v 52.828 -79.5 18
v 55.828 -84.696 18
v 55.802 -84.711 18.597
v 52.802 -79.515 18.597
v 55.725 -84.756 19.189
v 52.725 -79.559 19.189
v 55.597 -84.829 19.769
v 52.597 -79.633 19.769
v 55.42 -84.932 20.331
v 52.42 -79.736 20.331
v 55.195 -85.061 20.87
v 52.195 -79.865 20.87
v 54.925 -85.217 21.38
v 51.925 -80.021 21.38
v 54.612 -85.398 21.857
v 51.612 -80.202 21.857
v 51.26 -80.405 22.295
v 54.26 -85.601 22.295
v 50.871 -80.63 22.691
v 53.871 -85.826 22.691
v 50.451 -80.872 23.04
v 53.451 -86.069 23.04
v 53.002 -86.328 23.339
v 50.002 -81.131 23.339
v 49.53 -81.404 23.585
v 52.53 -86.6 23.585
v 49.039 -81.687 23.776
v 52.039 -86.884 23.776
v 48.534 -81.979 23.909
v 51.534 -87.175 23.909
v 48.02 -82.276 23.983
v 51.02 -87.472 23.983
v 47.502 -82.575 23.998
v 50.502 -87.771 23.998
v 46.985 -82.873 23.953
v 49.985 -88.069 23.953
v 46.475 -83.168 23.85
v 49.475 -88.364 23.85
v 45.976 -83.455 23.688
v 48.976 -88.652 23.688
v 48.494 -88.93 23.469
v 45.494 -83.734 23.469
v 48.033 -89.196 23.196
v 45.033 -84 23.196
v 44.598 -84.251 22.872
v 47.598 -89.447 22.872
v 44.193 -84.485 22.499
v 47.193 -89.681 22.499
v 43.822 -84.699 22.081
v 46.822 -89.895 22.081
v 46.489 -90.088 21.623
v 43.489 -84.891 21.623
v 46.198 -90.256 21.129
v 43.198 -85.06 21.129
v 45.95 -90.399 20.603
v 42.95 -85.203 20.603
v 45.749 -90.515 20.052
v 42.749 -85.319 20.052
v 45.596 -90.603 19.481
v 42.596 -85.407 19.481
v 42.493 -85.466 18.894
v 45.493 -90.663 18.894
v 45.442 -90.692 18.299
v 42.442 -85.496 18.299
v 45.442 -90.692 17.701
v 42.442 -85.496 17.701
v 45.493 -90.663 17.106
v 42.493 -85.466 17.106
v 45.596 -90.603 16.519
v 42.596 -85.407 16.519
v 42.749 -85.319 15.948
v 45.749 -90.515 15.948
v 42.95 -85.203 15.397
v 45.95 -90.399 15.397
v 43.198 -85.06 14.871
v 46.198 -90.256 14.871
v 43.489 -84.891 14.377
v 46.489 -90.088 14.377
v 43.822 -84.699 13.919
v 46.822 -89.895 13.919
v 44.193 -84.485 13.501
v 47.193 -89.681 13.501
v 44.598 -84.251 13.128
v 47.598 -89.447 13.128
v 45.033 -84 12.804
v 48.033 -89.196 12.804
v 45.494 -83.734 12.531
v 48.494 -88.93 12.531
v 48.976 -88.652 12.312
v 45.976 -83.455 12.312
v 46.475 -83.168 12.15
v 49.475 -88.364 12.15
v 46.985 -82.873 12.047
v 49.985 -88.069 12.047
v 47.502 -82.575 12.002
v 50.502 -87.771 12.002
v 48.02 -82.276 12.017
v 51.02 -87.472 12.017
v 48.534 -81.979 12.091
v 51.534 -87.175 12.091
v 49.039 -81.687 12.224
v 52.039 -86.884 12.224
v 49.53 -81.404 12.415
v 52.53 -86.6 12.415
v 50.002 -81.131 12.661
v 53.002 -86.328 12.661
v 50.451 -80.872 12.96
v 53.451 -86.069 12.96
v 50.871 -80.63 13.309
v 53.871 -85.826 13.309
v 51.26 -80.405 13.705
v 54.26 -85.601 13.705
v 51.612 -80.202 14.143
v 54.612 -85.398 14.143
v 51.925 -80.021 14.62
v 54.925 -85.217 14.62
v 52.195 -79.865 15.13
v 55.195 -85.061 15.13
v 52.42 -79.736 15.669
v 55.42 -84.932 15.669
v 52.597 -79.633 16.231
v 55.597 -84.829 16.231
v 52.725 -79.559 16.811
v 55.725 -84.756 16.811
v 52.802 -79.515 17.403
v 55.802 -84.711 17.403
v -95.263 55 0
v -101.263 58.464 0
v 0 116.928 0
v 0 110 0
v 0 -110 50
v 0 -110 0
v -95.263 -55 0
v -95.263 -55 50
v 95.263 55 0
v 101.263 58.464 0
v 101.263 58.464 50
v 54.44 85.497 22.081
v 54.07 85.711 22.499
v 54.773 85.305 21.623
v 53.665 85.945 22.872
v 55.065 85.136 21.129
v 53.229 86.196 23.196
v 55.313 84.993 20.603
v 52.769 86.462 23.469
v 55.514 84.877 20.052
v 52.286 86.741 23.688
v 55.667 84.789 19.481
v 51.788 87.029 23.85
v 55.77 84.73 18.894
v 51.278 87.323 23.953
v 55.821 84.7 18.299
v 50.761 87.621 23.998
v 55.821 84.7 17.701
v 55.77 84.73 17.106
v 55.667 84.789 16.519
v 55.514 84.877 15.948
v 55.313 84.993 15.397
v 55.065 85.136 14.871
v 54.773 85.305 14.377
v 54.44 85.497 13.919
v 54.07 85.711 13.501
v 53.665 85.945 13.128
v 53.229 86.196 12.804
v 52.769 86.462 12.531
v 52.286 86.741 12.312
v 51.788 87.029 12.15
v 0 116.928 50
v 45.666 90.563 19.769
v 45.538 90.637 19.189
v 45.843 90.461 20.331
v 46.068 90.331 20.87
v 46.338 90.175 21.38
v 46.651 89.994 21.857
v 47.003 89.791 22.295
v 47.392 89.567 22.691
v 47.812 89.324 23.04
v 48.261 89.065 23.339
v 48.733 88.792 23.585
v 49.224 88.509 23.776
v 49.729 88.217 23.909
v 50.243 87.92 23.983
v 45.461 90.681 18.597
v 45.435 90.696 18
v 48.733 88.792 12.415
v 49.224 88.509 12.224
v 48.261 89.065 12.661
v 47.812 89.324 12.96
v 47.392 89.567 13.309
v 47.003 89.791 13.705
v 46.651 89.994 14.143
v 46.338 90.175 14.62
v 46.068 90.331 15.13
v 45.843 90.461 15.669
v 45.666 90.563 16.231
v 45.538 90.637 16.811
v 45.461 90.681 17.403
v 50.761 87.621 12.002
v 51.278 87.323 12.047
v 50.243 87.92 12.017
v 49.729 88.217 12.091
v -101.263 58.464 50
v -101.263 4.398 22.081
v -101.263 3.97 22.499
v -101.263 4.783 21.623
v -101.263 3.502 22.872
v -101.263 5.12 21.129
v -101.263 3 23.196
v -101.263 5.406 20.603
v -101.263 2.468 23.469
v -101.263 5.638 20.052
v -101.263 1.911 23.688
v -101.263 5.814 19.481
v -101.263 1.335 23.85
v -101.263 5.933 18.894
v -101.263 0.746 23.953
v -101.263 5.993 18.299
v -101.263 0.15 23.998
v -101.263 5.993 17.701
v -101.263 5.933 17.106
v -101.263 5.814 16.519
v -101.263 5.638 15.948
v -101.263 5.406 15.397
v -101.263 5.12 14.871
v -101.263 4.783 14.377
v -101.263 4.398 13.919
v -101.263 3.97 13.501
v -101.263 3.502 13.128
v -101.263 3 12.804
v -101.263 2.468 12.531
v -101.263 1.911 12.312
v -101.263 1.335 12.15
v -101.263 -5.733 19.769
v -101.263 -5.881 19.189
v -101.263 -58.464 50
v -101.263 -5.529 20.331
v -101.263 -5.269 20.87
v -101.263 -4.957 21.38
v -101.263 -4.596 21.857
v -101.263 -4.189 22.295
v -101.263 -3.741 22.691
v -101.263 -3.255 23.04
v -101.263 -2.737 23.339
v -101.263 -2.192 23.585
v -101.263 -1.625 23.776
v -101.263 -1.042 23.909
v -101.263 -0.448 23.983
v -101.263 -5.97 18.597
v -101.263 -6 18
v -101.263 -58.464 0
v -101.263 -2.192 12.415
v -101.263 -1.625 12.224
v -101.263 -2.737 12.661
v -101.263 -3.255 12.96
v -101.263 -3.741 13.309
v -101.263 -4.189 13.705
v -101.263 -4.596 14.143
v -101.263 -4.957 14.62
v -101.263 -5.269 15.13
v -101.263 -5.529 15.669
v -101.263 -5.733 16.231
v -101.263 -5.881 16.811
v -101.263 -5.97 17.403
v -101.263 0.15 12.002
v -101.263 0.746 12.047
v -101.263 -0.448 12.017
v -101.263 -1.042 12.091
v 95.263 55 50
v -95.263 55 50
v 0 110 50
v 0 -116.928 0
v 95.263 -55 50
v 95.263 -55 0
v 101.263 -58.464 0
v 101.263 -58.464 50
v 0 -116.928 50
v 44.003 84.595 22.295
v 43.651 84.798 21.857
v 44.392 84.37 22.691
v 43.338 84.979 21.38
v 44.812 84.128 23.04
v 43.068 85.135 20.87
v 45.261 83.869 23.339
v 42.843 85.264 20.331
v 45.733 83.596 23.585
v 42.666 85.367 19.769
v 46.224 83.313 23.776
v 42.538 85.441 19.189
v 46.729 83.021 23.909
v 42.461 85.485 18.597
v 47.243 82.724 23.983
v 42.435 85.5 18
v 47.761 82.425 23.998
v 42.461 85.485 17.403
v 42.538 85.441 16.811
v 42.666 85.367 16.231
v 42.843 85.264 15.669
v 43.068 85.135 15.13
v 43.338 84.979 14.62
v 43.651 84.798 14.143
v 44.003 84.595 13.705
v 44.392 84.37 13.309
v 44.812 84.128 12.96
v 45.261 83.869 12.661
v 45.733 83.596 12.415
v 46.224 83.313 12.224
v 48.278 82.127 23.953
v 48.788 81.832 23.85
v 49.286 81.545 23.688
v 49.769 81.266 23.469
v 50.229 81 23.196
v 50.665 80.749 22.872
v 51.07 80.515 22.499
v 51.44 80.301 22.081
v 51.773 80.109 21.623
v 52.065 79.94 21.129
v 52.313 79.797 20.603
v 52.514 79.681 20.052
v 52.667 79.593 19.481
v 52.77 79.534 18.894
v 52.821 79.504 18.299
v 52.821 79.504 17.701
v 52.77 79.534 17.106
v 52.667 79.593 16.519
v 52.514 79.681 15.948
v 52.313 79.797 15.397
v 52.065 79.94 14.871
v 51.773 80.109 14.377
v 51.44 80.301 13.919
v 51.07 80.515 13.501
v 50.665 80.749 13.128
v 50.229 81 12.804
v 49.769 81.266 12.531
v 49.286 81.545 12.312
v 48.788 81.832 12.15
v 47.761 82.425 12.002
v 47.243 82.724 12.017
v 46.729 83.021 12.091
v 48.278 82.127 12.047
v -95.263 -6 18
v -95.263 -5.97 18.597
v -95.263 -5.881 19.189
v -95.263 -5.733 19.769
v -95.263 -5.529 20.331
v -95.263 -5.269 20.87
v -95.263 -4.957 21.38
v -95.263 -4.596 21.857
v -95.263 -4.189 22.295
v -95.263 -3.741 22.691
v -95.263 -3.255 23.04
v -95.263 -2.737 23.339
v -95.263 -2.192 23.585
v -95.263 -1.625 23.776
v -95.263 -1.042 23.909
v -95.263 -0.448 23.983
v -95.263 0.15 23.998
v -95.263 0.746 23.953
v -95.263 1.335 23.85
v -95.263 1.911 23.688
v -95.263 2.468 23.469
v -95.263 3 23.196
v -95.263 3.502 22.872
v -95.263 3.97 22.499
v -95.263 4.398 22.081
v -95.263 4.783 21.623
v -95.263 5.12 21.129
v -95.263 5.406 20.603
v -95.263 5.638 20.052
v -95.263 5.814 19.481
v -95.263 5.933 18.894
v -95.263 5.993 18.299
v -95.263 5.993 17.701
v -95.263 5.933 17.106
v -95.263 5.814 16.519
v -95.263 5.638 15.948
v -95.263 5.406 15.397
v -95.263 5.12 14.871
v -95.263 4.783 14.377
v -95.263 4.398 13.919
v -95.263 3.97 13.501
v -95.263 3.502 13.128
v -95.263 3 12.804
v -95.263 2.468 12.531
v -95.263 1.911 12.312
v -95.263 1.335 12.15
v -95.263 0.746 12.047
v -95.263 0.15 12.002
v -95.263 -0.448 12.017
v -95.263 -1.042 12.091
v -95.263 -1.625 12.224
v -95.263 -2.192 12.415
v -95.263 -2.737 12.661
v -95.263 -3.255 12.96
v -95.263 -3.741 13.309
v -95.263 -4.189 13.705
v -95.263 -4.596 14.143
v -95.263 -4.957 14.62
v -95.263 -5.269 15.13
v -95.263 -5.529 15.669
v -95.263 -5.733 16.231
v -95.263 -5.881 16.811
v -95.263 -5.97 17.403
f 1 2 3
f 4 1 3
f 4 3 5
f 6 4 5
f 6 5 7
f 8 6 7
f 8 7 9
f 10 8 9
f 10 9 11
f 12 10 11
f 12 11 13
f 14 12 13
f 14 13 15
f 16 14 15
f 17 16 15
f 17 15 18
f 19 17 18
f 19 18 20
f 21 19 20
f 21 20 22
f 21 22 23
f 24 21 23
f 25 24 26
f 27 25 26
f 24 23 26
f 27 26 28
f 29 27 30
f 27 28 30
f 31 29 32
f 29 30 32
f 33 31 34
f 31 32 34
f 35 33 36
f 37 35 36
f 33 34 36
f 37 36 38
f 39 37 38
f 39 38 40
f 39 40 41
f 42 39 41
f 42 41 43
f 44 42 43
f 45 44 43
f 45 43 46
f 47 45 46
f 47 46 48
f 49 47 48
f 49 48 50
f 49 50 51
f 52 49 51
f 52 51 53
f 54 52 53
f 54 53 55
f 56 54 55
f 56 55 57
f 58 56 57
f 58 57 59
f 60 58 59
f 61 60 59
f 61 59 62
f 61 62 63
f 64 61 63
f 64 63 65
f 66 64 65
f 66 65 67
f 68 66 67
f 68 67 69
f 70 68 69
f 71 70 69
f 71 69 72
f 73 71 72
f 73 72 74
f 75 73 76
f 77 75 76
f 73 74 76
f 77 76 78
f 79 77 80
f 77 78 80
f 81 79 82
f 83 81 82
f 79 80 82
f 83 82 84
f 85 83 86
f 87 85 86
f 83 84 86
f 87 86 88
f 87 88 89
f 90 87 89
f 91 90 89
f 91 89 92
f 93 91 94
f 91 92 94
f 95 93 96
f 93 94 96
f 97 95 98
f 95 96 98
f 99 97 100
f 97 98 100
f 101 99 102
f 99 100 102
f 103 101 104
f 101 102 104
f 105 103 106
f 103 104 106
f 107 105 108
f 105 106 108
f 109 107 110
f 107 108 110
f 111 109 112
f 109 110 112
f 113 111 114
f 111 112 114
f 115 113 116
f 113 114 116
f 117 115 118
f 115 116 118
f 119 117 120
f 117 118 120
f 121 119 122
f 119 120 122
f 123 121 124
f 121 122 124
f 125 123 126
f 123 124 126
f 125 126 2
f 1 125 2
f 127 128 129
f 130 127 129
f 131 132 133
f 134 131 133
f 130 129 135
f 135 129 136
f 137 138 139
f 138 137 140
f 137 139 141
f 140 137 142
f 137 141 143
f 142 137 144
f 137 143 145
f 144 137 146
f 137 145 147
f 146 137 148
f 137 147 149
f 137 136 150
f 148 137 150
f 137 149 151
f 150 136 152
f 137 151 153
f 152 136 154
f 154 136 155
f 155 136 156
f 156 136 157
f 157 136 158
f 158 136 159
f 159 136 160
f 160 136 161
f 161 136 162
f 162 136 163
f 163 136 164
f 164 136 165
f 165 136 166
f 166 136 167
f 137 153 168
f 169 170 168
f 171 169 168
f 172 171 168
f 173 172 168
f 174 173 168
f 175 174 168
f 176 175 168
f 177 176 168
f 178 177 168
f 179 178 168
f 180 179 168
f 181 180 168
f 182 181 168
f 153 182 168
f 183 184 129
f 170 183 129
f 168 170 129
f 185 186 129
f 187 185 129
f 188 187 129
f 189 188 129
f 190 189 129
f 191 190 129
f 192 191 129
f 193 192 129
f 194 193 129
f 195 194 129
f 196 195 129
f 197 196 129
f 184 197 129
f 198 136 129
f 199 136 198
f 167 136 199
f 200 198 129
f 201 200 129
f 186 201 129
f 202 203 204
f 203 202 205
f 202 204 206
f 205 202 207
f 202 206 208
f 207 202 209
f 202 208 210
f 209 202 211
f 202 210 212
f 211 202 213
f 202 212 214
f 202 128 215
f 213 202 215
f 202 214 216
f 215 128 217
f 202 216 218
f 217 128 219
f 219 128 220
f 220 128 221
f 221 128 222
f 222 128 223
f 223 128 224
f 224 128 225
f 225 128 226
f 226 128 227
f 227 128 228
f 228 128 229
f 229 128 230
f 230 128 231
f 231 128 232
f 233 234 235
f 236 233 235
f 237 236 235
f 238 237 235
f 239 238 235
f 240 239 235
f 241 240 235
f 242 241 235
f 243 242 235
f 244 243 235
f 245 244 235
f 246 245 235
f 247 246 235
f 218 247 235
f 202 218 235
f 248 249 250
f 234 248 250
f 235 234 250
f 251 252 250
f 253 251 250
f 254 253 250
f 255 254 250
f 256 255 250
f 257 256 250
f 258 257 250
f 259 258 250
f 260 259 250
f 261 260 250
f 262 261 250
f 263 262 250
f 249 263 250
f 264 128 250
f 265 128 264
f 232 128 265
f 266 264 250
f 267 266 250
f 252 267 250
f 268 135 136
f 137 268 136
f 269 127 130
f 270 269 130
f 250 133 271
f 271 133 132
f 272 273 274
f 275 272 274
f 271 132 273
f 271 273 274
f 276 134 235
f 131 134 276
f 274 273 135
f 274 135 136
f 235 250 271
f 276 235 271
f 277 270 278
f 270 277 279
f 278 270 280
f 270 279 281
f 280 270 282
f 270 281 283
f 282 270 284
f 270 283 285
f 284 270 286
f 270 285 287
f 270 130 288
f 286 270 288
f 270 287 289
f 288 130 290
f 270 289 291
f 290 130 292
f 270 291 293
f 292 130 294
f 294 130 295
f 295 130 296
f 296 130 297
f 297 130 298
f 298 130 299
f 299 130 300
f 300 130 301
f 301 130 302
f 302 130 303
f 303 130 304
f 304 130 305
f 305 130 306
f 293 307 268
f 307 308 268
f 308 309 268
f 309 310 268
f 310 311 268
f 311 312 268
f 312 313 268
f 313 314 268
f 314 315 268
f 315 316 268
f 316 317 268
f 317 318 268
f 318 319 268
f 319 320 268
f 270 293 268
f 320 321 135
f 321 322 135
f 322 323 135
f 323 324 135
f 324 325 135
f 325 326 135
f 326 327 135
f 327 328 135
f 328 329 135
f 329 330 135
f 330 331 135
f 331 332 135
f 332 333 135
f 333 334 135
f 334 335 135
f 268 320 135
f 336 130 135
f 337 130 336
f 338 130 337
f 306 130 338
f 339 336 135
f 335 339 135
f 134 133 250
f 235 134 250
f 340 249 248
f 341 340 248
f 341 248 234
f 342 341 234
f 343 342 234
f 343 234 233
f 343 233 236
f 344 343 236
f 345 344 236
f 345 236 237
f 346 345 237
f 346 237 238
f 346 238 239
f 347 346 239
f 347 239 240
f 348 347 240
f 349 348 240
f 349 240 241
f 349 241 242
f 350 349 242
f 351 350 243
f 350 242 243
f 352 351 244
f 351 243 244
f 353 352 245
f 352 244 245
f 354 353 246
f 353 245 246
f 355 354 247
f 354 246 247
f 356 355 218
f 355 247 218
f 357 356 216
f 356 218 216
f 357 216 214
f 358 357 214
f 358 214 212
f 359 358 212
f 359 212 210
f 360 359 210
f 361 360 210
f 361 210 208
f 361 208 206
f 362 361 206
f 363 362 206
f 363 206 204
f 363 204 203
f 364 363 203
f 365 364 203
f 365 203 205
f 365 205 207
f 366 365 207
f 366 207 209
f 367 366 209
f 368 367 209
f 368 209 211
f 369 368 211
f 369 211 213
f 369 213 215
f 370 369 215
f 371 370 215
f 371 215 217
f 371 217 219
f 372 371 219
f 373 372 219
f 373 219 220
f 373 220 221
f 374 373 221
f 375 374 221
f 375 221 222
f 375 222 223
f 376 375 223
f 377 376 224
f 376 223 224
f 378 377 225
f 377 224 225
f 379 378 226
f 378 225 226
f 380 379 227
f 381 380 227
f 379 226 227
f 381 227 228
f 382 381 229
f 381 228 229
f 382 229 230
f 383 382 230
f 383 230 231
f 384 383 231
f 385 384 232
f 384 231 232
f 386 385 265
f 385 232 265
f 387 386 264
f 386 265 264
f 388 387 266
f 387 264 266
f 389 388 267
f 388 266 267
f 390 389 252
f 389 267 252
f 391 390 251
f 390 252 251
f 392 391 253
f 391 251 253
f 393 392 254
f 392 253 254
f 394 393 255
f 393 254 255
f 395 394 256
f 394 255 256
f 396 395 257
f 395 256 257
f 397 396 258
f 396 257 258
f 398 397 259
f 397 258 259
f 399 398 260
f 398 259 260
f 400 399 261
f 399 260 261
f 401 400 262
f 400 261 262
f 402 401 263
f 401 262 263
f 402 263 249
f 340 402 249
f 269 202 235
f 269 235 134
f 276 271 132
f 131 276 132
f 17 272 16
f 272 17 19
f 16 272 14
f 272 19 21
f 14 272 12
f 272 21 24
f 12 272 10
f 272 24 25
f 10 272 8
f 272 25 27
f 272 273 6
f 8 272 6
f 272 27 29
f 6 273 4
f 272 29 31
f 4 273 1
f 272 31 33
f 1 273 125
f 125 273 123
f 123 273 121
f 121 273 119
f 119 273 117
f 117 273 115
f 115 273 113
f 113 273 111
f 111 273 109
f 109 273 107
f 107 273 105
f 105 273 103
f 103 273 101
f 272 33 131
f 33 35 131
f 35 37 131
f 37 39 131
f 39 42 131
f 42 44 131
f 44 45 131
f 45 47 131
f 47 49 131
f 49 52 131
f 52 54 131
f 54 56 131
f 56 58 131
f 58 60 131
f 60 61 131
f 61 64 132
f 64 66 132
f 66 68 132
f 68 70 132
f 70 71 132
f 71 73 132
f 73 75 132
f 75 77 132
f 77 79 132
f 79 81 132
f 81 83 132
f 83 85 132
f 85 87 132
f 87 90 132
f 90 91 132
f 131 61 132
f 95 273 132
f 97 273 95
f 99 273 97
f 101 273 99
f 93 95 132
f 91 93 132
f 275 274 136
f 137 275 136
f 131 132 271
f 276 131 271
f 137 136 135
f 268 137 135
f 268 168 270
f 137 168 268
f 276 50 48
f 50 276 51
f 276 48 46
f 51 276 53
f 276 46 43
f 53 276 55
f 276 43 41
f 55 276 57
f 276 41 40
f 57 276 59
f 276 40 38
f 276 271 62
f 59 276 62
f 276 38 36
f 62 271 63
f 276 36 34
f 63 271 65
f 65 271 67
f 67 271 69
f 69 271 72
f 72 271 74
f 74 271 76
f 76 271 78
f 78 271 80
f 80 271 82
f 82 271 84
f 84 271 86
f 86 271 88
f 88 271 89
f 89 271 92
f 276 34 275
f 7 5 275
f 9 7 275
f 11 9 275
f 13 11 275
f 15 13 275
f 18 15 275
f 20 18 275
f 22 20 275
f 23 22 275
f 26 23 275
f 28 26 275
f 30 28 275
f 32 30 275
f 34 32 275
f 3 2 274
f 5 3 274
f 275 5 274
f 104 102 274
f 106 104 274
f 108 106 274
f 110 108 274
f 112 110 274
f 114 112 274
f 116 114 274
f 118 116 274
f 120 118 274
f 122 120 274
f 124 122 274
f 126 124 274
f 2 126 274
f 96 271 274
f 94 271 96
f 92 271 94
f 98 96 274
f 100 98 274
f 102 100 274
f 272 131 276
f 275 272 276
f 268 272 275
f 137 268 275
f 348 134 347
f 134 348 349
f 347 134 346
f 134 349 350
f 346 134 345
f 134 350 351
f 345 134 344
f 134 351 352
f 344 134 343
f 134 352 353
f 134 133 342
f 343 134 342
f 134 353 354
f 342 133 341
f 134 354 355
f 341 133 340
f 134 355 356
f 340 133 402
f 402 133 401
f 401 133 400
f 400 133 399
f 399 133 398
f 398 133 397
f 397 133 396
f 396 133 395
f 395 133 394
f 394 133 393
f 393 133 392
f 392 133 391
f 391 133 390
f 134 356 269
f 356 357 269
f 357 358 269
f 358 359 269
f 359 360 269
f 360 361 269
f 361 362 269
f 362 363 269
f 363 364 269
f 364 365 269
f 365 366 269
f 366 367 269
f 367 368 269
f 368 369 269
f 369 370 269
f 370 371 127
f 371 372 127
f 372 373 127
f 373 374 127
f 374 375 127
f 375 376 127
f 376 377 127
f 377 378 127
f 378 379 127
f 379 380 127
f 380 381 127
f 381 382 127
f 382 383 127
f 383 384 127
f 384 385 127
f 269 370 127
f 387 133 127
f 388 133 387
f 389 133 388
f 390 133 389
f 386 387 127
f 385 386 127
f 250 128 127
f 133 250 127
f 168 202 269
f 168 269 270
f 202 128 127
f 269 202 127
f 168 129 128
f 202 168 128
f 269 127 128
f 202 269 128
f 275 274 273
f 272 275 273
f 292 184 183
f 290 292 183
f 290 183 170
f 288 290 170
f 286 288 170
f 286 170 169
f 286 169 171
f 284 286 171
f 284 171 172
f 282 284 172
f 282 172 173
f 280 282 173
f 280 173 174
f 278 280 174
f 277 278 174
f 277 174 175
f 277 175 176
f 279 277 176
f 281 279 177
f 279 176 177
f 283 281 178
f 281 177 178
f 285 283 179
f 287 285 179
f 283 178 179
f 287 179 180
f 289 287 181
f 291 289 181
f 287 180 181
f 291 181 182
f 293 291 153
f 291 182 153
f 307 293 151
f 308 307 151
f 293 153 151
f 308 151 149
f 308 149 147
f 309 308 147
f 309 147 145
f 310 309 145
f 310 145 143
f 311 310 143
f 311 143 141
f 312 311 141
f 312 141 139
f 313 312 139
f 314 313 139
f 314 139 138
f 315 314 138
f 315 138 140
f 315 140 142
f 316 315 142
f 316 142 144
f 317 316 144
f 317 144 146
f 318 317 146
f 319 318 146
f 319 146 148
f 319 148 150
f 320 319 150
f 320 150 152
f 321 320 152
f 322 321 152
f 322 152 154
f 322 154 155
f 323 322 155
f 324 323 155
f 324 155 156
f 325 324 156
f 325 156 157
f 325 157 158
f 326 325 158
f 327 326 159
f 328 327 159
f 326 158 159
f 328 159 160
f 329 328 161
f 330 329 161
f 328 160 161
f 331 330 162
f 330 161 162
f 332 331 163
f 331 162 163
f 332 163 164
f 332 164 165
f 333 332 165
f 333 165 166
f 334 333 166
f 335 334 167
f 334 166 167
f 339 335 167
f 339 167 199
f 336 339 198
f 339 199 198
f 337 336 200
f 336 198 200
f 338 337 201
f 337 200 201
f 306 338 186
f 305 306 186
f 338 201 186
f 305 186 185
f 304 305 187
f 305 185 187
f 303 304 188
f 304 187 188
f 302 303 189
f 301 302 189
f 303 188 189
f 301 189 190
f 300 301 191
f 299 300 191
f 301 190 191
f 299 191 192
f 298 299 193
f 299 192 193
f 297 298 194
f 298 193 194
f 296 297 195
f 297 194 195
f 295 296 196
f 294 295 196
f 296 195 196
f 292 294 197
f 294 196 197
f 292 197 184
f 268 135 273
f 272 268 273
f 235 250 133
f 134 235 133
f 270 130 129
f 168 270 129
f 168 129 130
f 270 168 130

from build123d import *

# Parameters (mm, degrees)
F1_DEPTH  = 50
F2_DEPTH  = 50
F3_DEPTH  = 50
F4_DEPTH  = 50
F5_DEPTH  = 50
F6_DEPTH  = 50
F7_R      = 6
F8_DEPTH  = 25
F9_R      = 6
F11_DEPTH = 25
F10_R     = 6
F12_DEPTH = 25


with BuildPart() as f1:
    # F0 (on Top) → F1 (new body)
    with BuildSketch(Plane.XY):
        Polygon((0, 110), (0, 116.9282032303), (-101.2627944163, 58.4641016151), (-95.2627944163, 55), align=None)
    extrude(amount=F1_DEPTH)


with BuildPart() as f2:
    # F0 (on Top) → F2 (new body)
    with BuildSketch(Plane.XY):
        Polygon((-101.2627944163, 58.4641016151), (-101.2627944163, -58.4641016151), (-95.2627944163, -55), (-95.2627944163, 55), align=None)
    extrude(amount=F2_DEPTH)

    # F10 (on face) → F12 (cut)
    with BuildSketch(Plane(origin=(-101.2627944163, 0, 0), x_dir=(0, -1, 0), z_dir=(-1, 0, 0))):
        with Locations((0, 18)):
            Circle(F10_R)
    extrude(amount=-F12_DEPTH, mode=Mode.SUBTRACT)


with BuildPart() as f3:
    # F0 (on Top) → F3 (new body)
    with BuildSketch(Plane.XY):
        Polygon((-101.2627944163, -58.4641016151), (0, -116.9282032303), (0, -110), (-95.2627944163, -55), align=None)
    extrude(amount=F3_DEPTH)


with BuildPart() as f4:
    # F0 (on Top) → F4 (new body)
    with BuildSketch(Plane.XY):
        Polygon((95.2627944163, 55), (101.2627944163, 58.4641016151), (0, 116.9282032303), (0, 110), align=None)
    extrude(amount=F4_DEPTH)

    # F9 (on face) → F11 (cut)
    with BuildSketch(Plane(origin=(50.6313972081, 87.6961524227, 0), x_dir=(-0.8660254038, 0.5, 0), z_dir=(0.5, 0.8660254038, 0))):
        with Locations((0, 18)):
            Circle(F9_R)
    extrude(amount=-F11_DEPTH, mode=Mode.SUBTRACT)


with BuildPart() as f5:
    # F0 (on Top) → F5 (new body)
    with BuildSketch(Plane.XY):
        Polygon((95.2627944163, -55), (101.2627944163, -58.4641016151), (101.2627944163, 58.4641016151), (95.2627944163, 55), align=None)
    extrude(amount=F5_DEPTH)


with BuildPart() as f6:
    # F0 (on Top) → F6 (new body)
    with BuildSketch(Plane.XY):
        Polygon((0, -116.9282032303), (101.2627944163, -58.4641016151), (95.2627944163, -55), (0, -110), align=None)
    extrude(amount=F6_DEPTH)

    # F7 (on face) → F8 (cut)
    with BuildSketch(Plane(origin=(50.6313972081, -87.6961524227, 0), x_dir=(0.8660254038, 0.5, 0), z_dir=(0.5, -0.8660254038, 0))):
        with Locations((0, 18)):
            Circle(F7_R)
    extrude(amount=-F8_DEPTH, mode=Mode.SUBTRACT)


solid = Compound([f1.part, f2.part, f3.part, f4.part, f5.part, f6.part])
